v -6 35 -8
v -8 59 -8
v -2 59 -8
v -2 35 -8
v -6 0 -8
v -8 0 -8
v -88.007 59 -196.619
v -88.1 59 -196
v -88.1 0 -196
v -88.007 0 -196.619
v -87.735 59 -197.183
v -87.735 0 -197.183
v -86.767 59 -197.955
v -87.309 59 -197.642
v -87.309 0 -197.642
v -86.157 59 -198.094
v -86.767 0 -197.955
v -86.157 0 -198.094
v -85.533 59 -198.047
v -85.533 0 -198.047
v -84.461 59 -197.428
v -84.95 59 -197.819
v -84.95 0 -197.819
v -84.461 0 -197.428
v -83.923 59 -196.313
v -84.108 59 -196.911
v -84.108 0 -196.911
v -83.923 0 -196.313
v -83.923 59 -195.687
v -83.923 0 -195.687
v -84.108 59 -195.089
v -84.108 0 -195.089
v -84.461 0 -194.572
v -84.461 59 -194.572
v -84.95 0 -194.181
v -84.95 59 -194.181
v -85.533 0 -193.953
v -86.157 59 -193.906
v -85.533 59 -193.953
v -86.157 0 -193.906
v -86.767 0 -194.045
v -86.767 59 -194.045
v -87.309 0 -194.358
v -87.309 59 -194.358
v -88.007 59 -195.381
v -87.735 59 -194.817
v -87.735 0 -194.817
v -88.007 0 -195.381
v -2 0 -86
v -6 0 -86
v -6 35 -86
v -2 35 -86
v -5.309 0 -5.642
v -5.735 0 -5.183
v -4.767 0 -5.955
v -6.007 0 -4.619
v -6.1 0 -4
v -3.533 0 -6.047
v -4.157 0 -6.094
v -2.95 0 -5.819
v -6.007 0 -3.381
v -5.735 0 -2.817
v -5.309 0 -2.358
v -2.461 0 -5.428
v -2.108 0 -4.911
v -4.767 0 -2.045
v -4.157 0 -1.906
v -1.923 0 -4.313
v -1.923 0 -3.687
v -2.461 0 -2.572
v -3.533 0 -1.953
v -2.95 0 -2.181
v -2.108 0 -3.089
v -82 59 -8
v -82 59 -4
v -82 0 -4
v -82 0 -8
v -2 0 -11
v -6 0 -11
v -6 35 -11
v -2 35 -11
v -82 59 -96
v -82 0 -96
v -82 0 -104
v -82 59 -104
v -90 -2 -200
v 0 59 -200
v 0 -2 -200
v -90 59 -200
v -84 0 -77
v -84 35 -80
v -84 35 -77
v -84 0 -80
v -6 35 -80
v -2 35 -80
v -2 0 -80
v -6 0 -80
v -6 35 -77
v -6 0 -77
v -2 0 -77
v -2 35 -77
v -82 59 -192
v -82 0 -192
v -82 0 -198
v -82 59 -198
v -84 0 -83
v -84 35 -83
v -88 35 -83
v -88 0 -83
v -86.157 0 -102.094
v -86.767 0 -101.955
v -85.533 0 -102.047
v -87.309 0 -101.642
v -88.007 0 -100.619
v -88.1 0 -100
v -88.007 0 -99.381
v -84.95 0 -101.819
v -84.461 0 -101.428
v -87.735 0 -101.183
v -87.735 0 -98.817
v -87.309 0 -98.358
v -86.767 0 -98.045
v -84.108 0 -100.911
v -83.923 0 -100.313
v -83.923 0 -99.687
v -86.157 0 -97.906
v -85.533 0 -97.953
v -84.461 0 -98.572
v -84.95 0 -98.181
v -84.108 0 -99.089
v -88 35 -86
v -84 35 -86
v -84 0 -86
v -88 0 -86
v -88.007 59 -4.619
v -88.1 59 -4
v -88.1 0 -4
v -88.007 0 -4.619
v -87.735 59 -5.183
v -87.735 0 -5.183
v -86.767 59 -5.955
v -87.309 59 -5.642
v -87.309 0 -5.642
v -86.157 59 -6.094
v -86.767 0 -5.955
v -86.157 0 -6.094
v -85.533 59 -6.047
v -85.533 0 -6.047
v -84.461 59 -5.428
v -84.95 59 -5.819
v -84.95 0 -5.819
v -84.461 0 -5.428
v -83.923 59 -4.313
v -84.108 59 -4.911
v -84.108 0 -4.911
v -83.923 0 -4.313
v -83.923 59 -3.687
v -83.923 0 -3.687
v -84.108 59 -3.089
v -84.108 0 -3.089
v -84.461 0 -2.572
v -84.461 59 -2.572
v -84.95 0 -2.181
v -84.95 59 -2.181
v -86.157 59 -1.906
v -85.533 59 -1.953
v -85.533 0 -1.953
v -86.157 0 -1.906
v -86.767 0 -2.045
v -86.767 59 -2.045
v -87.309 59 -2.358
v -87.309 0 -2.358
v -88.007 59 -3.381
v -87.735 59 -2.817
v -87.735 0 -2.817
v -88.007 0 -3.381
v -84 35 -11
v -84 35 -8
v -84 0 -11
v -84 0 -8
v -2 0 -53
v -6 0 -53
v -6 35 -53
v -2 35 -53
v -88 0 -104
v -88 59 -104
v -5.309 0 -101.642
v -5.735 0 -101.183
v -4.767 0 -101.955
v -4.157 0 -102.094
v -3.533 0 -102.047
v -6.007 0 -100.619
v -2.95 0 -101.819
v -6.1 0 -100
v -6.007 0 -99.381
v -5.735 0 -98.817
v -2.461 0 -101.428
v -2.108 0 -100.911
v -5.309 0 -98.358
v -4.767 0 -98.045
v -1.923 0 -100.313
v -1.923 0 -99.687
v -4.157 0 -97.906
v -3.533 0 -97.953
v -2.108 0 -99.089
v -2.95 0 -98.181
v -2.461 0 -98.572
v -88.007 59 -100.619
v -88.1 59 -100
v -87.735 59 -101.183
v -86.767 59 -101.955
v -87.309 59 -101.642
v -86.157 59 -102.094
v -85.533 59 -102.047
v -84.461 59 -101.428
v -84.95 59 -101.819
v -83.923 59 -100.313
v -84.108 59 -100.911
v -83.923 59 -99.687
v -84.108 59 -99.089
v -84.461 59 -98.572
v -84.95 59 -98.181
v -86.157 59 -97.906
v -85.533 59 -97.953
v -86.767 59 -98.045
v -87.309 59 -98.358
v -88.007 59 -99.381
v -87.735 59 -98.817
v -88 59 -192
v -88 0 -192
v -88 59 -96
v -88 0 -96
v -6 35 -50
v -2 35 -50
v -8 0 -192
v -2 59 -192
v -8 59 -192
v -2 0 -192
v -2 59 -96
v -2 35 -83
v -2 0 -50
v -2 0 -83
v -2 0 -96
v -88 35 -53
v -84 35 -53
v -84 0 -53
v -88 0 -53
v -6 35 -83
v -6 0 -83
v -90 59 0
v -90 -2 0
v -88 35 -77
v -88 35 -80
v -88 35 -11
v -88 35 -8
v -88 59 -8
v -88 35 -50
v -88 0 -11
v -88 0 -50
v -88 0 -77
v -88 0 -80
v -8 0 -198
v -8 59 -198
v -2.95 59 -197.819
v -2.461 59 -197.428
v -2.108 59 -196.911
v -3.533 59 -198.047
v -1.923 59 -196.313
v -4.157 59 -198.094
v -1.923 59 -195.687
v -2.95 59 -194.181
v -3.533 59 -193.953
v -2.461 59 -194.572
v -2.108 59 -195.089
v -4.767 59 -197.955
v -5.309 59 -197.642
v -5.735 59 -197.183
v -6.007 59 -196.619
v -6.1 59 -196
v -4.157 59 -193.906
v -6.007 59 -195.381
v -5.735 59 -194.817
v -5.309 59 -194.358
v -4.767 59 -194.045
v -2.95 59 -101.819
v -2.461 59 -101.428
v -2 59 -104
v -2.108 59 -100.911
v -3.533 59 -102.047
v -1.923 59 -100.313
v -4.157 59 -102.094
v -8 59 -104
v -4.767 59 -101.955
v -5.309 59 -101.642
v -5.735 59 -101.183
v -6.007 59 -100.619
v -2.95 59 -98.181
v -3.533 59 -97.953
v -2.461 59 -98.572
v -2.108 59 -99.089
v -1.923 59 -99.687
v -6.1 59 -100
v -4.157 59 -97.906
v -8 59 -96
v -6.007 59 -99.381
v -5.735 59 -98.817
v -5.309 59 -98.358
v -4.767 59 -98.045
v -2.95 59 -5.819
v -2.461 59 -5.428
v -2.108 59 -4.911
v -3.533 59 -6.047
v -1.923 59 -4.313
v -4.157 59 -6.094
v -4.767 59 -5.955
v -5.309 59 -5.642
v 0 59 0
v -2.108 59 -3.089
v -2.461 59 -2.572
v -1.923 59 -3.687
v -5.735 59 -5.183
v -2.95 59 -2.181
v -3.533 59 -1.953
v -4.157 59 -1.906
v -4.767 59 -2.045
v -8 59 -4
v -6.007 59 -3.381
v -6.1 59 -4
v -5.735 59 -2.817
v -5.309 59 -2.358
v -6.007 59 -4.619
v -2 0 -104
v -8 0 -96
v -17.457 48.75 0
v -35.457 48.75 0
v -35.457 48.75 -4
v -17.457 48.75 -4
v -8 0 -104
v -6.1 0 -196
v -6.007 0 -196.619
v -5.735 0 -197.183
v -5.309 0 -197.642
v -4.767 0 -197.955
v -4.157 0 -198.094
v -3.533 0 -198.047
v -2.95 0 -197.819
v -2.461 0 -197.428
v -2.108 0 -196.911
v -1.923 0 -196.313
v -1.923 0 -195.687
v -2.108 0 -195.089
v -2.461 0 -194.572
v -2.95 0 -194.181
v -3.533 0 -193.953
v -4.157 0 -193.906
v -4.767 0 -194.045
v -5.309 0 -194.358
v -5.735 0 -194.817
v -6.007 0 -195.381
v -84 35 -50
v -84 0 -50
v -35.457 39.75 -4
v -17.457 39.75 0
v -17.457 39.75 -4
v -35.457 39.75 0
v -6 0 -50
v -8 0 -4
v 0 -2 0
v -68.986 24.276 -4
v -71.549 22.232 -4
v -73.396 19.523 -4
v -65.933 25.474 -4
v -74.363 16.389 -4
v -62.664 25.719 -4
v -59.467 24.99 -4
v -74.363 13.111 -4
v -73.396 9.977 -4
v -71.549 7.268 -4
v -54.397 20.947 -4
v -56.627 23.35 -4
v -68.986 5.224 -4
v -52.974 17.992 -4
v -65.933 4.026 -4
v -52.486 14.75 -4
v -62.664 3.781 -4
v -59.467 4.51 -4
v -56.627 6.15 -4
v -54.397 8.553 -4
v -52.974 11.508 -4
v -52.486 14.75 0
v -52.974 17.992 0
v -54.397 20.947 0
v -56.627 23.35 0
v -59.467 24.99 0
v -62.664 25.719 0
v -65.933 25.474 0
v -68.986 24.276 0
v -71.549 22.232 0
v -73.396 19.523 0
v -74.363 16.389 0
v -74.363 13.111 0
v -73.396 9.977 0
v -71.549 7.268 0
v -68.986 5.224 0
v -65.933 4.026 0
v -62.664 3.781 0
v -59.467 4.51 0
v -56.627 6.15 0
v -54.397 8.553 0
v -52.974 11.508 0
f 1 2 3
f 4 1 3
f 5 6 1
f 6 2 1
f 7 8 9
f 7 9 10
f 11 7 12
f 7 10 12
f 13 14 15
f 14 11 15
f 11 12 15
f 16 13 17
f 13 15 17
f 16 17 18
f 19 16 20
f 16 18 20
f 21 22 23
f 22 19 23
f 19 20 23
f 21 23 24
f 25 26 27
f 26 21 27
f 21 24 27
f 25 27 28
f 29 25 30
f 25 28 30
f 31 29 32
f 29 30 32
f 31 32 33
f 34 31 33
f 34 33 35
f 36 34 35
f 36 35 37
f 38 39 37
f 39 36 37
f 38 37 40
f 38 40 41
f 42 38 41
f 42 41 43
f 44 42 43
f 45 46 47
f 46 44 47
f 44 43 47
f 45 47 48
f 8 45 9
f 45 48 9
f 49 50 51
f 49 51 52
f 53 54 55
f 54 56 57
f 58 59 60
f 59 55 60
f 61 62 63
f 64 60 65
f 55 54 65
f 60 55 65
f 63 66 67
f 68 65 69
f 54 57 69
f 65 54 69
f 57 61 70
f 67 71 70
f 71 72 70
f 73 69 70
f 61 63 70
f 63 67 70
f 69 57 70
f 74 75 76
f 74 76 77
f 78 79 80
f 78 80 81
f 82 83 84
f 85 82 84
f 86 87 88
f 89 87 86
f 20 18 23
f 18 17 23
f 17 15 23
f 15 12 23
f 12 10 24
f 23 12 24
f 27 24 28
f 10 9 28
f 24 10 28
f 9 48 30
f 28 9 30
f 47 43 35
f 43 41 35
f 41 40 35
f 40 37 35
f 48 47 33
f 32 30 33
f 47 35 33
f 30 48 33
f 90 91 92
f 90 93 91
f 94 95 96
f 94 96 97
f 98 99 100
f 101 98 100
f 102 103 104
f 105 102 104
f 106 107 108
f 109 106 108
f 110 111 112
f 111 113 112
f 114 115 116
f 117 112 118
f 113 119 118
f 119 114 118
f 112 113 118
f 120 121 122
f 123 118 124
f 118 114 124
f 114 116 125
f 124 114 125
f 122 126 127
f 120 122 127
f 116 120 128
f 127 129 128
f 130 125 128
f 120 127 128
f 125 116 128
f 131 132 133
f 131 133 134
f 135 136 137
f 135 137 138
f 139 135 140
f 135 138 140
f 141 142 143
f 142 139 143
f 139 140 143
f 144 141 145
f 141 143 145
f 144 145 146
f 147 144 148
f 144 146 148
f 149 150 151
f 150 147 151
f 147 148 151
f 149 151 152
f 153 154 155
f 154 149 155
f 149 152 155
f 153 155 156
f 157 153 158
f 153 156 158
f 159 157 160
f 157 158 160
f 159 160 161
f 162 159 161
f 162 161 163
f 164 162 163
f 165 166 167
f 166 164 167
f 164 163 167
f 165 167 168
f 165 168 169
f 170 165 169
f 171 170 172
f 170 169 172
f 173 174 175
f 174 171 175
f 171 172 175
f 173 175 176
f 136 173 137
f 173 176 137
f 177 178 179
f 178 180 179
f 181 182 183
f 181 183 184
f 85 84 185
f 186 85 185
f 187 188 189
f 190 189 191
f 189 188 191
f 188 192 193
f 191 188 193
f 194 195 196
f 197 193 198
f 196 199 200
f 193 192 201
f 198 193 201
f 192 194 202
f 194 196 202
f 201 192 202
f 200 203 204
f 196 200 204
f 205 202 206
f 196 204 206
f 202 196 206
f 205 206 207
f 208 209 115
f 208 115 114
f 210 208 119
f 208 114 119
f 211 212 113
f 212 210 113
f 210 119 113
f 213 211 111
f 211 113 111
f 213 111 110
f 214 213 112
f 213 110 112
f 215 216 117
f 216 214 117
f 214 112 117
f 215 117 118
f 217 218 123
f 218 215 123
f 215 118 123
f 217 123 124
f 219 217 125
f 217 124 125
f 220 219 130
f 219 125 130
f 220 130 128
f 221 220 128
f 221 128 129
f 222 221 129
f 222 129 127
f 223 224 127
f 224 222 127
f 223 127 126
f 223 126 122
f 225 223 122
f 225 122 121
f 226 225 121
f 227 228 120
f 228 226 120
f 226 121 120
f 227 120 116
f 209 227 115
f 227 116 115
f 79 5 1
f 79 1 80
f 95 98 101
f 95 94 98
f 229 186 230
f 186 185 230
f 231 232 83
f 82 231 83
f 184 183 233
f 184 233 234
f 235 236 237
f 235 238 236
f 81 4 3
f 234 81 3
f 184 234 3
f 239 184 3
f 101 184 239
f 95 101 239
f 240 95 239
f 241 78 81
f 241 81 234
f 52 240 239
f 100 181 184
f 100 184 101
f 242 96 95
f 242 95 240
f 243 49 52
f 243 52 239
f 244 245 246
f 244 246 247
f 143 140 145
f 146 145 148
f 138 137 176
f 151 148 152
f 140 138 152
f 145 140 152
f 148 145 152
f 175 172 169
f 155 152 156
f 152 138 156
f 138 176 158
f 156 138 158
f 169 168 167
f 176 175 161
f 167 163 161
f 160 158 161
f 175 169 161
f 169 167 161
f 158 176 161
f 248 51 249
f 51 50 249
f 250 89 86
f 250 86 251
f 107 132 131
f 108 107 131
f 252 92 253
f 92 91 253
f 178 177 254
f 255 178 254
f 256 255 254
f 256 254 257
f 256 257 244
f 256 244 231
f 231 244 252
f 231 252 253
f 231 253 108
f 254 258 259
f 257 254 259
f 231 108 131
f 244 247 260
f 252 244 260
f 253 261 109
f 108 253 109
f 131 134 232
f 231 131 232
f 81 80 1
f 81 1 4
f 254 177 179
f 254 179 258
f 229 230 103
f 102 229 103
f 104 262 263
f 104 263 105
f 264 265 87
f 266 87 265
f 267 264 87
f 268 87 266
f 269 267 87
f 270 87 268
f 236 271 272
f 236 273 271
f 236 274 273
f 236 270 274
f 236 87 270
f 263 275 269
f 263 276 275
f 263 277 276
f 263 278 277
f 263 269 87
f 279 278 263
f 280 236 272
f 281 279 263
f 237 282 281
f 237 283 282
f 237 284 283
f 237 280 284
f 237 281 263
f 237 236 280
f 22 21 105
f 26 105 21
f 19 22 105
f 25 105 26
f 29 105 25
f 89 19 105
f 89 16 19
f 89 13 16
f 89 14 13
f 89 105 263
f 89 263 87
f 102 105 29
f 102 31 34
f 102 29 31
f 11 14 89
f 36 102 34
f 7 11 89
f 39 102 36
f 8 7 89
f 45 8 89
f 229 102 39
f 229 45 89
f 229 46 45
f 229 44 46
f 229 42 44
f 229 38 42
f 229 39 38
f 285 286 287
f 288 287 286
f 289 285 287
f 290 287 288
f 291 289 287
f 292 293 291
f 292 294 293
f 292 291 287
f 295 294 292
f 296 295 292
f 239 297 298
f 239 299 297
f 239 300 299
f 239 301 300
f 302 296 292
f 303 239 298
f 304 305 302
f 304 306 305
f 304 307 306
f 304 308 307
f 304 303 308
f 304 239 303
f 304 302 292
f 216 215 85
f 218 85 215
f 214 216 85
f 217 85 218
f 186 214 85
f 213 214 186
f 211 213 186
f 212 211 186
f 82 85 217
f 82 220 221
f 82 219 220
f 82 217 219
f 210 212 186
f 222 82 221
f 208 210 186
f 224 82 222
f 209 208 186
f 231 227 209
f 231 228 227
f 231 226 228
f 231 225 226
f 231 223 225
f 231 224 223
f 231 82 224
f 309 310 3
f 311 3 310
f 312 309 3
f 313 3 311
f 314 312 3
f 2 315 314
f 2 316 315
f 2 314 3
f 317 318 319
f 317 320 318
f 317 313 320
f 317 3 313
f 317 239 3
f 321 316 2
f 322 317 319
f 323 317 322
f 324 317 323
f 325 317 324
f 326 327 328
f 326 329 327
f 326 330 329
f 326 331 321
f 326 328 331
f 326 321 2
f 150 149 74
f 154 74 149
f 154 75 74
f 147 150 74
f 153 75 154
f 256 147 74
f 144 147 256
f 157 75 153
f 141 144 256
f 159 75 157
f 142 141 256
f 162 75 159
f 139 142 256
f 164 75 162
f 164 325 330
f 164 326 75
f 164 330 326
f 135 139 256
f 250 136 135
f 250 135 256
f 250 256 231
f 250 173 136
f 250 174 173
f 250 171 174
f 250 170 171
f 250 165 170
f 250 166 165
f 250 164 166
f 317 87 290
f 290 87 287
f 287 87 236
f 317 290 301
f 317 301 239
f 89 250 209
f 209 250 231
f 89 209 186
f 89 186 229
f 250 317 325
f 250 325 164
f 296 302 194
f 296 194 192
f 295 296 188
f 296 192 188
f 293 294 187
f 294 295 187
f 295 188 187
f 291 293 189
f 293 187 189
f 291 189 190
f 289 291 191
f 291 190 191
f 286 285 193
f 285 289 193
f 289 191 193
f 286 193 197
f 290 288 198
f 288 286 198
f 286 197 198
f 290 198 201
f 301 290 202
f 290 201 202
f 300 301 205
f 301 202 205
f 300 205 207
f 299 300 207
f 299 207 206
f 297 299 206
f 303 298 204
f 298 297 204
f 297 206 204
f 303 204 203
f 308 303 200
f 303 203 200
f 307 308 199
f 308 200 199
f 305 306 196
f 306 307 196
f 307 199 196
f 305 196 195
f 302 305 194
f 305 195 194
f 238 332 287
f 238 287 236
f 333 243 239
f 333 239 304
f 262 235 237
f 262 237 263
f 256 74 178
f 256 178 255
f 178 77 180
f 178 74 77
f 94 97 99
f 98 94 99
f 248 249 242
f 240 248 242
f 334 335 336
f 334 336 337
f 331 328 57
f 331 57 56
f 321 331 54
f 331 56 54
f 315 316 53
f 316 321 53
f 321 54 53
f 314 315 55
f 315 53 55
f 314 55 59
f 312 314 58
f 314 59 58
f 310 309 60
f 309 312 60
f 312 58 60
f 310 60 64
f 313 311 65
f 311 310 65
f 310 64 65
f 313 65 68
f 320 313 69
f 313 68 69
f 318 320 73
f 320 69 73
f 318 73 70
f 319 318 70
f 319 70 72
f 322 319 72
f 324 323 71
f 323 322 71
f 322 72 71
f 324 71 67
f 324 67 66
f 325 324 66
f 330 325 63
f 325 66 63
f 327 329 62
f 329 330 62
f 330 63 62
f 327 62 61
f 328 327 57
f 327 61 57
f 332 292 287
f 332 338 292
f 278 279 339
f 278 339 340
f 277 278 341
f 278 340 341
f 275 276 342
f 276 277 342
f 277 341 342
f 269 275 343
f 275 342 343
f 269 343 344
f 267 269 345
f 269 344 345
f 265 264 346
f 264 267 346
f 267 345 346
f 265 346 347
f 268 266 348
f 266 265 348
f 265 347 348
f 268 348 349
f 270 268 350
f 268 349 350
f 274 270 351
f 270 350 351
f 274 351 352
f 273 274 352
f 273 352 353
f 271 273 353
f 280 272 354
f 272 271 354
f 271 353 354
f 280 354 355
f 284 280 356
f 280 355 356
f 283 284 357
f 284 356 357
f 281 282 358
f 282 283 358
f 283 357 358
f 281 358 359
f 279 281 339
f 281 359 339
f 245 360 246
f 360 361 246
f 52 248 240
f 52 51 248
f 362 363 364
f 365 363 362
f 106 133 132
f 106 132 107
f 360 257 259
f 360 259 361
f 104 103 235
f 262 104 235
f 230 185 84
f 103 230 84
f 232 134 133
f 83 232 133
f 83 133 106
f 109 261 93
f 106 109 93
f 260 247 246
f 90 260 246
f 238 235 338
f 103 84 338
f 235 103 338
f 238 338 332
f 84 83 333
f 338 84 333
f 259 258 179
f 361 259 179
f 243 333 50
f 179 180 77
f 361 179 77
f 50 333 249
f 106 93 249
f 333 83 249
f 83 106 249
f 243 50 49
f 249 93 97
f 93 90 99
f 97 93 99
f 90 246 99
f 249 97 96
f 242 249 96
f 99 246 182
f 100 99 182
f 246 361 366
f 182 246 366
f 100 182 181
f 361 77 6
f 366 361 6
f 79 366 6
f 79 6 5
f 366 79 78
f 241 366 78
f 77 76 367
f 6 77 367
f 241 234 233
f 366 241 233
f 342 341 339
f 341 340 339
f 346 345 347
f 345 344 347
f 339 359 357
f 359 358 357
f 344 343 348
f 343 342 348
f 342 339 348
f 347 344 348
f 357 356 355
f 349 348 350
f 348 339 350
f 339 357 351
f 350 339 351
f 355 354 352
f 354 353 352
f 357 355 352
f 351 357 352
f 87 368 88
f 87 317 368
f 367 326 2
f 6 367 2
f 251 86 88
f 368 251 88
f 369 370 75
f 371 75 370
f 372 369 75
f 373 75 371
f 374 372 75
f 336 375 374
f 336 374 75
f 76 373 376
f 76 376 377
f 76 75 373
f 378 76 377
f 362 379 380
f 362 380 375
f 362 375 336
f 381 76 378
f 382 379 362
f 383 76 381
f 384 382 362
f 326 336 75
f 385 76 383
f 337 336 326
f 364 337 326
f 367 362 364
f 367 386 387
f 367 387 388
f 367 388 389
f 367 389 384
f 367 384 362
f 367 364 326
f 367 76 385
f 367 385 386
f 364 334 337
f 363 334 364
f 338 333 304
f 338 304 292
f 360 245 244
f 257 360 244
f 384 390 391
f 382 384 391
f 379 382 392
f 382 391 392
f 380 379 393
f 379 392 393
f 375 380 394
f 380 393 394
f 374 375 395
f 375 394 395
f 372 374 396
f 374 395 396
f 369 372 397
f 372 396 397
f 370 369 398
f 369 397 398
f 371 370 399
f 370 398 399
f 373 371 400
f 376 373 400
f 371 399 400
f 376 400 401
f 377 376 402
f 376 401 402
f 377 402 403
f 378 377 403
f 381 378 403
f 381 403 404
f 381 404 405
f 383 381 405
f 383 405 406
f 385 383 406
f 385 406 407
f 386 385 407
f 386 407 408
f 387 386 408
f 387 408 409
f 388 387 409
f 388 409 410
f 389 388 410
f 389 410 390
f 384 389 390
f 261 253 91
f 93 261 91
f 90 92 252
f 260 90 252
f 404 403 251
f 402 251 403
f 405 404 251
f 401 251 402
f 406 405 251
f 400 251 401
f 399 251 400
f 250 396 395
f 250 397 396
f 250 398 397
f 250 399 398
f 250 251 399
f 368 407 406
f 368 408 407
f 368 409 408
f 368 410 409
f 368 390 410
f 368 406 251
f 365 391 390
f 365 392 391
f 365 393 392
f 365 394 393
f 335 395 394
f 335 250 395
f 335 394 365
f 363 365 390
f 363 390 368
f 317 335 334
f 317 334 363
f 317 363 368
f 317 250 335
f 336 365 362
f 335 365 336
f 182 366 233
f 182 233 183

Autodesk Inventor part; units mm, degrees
ref_plane "YZ Plane" through (0, 0, 0) normal (1, 0, 0) x (0, 1, 0)
ref_plane "XZ Plane" through (0, 0, 0) normal (0, 1, 0) x (-1, 0, 0)
ref_plane "XY Plane" through (0, 0, 0) normal (0, 0, 1) x (1, 0, 0)
sketch "Sketch2" plane through (0, 0, 0) normal (0, 1, 0) x (-1, 0, 0)
  line L0 (0, 0) -> (0, -200)
  line L1 (0, -200) -> (90, -200)
  line L2 (90, -200) -> (90, 0)
  line L3 (90, 0) -> (0, 0)
  line L4 (0, 0) -> (0, -8)
  line L5 (2, -96) -> (8, -96)
  line L6 (8, -96) -> (8, -104)
  line L7 (8, -104) -> (2, -104)
  line L8 (2, -104) -> (2, -192)
  line L9 (2, -192) -> (8, -192)
  line L10 (8, -192) -> (8, -198)
  line L11 (8, -198) -> (45, -198)
  line L12 (8, -4) -> (45, -4)
  line L13 (8, -4) -> (8, -8)
  line L14 (88, -96) -> (82, -96)
  line L15 (82, -96) -> (82, -104)
  line L16 (82, -104) -> (88, -104)
  line L17 (88, -104) -> (88, -192)
  line L18 (88, -192) -> (82, -192)
  line L19 (82, -192) -> (82, -198)
  line L20 (82, -198) -> (45, -198)
  line L21 (82, -4) -> (45, -4)
  line L22 (82, -4) -> (82, -8)
  line L23 (90, -200) -> (90, -196)
  line L24 (0, -200) -> (0, -196)
  circle A0 centre (4, -196) radius 2.1
  circle A1 centre (86, -196) radius 2.1
  circle A2 centre (86, -100) radius 2.1
  circle A3 centre (86, -4) radius 2.1
  circle A4 centre (4, -4) radius 2.1
  circle A5 centre (4, -100) radius 2.1
  line L25 (6, -86) -> (6, -83)
  line L26 (6, -86) -> (2, -86)
  line L27 (2, -86) -> (2, -96)
  line L28 (6, -83) -> (2, -83)
  line L29 (2, -83) -> (2, -80)
  line L30 (2, -80) -> (6, -80)
  line L31 (6, -80) -> (6, -77)
  line L32 (6, -77) -> (2, -77)
  line L33 (84, -86) -> (84, -83)
  line L34 (84, -86) -> (88, -86)
  line L35 (84, -83) -> (88, -83)
  line L36 (88, -83) -> (88, -80)
  line L37 (88, -80) -> (84, -80)
  line L38 (84, -80) -> (84, -77)
  line L39 (84, -77) -> (88, -77)
  line L40 (88, -86) -> (88, -96)
  line L41 (84, -8) -> (84, -11)
  line L42 (84, -11) -> (88, -11)
  line L43 (88, -50) -> (84, -50)
  line L44 (84, -50) -> (84, -53)
  line L45 (84, -53) -> (88, -53)
  line L46 (82, -8) -> (84, -8)
  line L47 (88, -11) -> (88, -50)
  line L48 (88, -53) -> (88, -77)
  line L49 (6, -8) -> (6, -11)
  line L50 (6, -11) -> (2, -11)
  line L51 (2, -50) -> (6, -50)
  line L52 (6, -50) -> (6, -53)
  line L53 (6, -53) -> (2, -53)
  line L54 (8, -8) -> (6, -8)
  line L55 (2, -11) -> (2, -50)
  line L56 (2, -53) -> (2, -77)
  dimension "d1" = 200
  dimension "d2" = 90
  dimension "d3" = 200
  dimension "d4" = 8
  dimension "d5" = 8
  dimension "d8" = 6
  dimension "d9" = 8
  dimension "d10" = 6
  dimension "d11" = 88
  dimension "d12" = 6
  dimension "d13" = 6
  dimension "d41" = 4
  dimension "d43" = 4
  dimension "d45" = 4.2
  dimension "d46" = 4.2
  dimension "d47" = 4.2
  dimension "d48" = 4.2
  dimension "d49" = 4.2
  dimension "d50" = 4.2
  dimension "d87" = 3
  dimension "d88" = 4
  dimension "d89" = 4
  dimension "d90" = 3
  dimension "d92" = 4
  dimension "d93" = 3
  dimension "d94" = 4
  dimension "d96" = 3
  dimension "d98" = 3
extrude "Extrusion1" add sketch "Sketch2" along normal blind 59
sketch "Sketch11" plane through (-90, 0, 0) normal (0, 0, 1) x (1, 0, 0)
  circle A0 centre (26.5144, 14.75) radius 11
  line L0 (63.5431, 48.75) -> (72.5431, 48.75)
  line L1 (72.5431, 48.75) -> (72.5431, 39.75)
  line L2 (72.5431, 39.75) -> (54.5431, 39.75)
  line L3 (54.5431, 39.75) -> (54.5431, 48.75)
  line L4 (54.5431, 48.75) -> (63.5431, 48.75)
  dimension "d76" = 22
  dimension "d78" = 9
  dimension "d79" = 9
  dimension "d80" = 18
  dimension "d81" = 9
extrude "Extrusion7" cut sketch "Sketch11" against normal blind 5
sketch "Sketch12" plane through (0, 59, 0) normal (0, 1, 0) x (1, 0, 0)
  point P0 (0, 0)
sketch "Sketch13" plane through (-84, 0, -86) normal (0, 0, -1) x (-1, 0, 0)
  line L0 (0, 35) -> (4, 35)
  line L1 (0, 35) -> (0, 59)
  line L2 (0, 59) -> (4, 59) projected
  line L3 (0, 59) -> (4, 59)
  line L4 (4, 59) -> (4, 35)
  point P0 (-84, 0)
  point P1 (4, 0)
  point P2 (0, 0)
extrude "Extrusion8" cut sketch "Sketch13" against normal blind 78
sketch "Sketch14" plane through (-2, 0, -86) normal (0, 0, -1) x (-1, 0, 0)
  line L0 (4, 0) -> (4, 59) projected
  line L1 (4, 0) -> (4, 35)
  line L2 (4, 0) -> (39, 0) construction
  line L3 (4, 35) -> (0, 35)
  line L4 (0, 0) -> (0, 59) projected
  line L5 (0, 35) -> (0, 59)
  line L6 (0, 59) -> (4, 59)
  line L7 (4, 59) -> (4, 35)
  point P0 (-2, 0)
  dimension "d104" = 35
  dimension "d105" = 90
extrude "Extrusion9" cut sketch "Sketch14" against normal blind 78
sketch "Sketch15" plane through (0, 0, 0) normal (0, -1, 0) x (1, 0, 0)
  line L0 (-90, 0) -> (0, 0) projected
  line L1 (0, -200) -> (-90, -200) projected
  line L2 (0, 0) -> (0, -200)
  line L3 (0, -200) -> (-90, -200)
  line L4 (-90, -200) -> (-90, 0)
  line L5 (-90, 0) -> (0, 0)
extrude "Extrusion10" add sketch "Sketch15" along normal blind 2
properties part number "Housing Rev 3"
